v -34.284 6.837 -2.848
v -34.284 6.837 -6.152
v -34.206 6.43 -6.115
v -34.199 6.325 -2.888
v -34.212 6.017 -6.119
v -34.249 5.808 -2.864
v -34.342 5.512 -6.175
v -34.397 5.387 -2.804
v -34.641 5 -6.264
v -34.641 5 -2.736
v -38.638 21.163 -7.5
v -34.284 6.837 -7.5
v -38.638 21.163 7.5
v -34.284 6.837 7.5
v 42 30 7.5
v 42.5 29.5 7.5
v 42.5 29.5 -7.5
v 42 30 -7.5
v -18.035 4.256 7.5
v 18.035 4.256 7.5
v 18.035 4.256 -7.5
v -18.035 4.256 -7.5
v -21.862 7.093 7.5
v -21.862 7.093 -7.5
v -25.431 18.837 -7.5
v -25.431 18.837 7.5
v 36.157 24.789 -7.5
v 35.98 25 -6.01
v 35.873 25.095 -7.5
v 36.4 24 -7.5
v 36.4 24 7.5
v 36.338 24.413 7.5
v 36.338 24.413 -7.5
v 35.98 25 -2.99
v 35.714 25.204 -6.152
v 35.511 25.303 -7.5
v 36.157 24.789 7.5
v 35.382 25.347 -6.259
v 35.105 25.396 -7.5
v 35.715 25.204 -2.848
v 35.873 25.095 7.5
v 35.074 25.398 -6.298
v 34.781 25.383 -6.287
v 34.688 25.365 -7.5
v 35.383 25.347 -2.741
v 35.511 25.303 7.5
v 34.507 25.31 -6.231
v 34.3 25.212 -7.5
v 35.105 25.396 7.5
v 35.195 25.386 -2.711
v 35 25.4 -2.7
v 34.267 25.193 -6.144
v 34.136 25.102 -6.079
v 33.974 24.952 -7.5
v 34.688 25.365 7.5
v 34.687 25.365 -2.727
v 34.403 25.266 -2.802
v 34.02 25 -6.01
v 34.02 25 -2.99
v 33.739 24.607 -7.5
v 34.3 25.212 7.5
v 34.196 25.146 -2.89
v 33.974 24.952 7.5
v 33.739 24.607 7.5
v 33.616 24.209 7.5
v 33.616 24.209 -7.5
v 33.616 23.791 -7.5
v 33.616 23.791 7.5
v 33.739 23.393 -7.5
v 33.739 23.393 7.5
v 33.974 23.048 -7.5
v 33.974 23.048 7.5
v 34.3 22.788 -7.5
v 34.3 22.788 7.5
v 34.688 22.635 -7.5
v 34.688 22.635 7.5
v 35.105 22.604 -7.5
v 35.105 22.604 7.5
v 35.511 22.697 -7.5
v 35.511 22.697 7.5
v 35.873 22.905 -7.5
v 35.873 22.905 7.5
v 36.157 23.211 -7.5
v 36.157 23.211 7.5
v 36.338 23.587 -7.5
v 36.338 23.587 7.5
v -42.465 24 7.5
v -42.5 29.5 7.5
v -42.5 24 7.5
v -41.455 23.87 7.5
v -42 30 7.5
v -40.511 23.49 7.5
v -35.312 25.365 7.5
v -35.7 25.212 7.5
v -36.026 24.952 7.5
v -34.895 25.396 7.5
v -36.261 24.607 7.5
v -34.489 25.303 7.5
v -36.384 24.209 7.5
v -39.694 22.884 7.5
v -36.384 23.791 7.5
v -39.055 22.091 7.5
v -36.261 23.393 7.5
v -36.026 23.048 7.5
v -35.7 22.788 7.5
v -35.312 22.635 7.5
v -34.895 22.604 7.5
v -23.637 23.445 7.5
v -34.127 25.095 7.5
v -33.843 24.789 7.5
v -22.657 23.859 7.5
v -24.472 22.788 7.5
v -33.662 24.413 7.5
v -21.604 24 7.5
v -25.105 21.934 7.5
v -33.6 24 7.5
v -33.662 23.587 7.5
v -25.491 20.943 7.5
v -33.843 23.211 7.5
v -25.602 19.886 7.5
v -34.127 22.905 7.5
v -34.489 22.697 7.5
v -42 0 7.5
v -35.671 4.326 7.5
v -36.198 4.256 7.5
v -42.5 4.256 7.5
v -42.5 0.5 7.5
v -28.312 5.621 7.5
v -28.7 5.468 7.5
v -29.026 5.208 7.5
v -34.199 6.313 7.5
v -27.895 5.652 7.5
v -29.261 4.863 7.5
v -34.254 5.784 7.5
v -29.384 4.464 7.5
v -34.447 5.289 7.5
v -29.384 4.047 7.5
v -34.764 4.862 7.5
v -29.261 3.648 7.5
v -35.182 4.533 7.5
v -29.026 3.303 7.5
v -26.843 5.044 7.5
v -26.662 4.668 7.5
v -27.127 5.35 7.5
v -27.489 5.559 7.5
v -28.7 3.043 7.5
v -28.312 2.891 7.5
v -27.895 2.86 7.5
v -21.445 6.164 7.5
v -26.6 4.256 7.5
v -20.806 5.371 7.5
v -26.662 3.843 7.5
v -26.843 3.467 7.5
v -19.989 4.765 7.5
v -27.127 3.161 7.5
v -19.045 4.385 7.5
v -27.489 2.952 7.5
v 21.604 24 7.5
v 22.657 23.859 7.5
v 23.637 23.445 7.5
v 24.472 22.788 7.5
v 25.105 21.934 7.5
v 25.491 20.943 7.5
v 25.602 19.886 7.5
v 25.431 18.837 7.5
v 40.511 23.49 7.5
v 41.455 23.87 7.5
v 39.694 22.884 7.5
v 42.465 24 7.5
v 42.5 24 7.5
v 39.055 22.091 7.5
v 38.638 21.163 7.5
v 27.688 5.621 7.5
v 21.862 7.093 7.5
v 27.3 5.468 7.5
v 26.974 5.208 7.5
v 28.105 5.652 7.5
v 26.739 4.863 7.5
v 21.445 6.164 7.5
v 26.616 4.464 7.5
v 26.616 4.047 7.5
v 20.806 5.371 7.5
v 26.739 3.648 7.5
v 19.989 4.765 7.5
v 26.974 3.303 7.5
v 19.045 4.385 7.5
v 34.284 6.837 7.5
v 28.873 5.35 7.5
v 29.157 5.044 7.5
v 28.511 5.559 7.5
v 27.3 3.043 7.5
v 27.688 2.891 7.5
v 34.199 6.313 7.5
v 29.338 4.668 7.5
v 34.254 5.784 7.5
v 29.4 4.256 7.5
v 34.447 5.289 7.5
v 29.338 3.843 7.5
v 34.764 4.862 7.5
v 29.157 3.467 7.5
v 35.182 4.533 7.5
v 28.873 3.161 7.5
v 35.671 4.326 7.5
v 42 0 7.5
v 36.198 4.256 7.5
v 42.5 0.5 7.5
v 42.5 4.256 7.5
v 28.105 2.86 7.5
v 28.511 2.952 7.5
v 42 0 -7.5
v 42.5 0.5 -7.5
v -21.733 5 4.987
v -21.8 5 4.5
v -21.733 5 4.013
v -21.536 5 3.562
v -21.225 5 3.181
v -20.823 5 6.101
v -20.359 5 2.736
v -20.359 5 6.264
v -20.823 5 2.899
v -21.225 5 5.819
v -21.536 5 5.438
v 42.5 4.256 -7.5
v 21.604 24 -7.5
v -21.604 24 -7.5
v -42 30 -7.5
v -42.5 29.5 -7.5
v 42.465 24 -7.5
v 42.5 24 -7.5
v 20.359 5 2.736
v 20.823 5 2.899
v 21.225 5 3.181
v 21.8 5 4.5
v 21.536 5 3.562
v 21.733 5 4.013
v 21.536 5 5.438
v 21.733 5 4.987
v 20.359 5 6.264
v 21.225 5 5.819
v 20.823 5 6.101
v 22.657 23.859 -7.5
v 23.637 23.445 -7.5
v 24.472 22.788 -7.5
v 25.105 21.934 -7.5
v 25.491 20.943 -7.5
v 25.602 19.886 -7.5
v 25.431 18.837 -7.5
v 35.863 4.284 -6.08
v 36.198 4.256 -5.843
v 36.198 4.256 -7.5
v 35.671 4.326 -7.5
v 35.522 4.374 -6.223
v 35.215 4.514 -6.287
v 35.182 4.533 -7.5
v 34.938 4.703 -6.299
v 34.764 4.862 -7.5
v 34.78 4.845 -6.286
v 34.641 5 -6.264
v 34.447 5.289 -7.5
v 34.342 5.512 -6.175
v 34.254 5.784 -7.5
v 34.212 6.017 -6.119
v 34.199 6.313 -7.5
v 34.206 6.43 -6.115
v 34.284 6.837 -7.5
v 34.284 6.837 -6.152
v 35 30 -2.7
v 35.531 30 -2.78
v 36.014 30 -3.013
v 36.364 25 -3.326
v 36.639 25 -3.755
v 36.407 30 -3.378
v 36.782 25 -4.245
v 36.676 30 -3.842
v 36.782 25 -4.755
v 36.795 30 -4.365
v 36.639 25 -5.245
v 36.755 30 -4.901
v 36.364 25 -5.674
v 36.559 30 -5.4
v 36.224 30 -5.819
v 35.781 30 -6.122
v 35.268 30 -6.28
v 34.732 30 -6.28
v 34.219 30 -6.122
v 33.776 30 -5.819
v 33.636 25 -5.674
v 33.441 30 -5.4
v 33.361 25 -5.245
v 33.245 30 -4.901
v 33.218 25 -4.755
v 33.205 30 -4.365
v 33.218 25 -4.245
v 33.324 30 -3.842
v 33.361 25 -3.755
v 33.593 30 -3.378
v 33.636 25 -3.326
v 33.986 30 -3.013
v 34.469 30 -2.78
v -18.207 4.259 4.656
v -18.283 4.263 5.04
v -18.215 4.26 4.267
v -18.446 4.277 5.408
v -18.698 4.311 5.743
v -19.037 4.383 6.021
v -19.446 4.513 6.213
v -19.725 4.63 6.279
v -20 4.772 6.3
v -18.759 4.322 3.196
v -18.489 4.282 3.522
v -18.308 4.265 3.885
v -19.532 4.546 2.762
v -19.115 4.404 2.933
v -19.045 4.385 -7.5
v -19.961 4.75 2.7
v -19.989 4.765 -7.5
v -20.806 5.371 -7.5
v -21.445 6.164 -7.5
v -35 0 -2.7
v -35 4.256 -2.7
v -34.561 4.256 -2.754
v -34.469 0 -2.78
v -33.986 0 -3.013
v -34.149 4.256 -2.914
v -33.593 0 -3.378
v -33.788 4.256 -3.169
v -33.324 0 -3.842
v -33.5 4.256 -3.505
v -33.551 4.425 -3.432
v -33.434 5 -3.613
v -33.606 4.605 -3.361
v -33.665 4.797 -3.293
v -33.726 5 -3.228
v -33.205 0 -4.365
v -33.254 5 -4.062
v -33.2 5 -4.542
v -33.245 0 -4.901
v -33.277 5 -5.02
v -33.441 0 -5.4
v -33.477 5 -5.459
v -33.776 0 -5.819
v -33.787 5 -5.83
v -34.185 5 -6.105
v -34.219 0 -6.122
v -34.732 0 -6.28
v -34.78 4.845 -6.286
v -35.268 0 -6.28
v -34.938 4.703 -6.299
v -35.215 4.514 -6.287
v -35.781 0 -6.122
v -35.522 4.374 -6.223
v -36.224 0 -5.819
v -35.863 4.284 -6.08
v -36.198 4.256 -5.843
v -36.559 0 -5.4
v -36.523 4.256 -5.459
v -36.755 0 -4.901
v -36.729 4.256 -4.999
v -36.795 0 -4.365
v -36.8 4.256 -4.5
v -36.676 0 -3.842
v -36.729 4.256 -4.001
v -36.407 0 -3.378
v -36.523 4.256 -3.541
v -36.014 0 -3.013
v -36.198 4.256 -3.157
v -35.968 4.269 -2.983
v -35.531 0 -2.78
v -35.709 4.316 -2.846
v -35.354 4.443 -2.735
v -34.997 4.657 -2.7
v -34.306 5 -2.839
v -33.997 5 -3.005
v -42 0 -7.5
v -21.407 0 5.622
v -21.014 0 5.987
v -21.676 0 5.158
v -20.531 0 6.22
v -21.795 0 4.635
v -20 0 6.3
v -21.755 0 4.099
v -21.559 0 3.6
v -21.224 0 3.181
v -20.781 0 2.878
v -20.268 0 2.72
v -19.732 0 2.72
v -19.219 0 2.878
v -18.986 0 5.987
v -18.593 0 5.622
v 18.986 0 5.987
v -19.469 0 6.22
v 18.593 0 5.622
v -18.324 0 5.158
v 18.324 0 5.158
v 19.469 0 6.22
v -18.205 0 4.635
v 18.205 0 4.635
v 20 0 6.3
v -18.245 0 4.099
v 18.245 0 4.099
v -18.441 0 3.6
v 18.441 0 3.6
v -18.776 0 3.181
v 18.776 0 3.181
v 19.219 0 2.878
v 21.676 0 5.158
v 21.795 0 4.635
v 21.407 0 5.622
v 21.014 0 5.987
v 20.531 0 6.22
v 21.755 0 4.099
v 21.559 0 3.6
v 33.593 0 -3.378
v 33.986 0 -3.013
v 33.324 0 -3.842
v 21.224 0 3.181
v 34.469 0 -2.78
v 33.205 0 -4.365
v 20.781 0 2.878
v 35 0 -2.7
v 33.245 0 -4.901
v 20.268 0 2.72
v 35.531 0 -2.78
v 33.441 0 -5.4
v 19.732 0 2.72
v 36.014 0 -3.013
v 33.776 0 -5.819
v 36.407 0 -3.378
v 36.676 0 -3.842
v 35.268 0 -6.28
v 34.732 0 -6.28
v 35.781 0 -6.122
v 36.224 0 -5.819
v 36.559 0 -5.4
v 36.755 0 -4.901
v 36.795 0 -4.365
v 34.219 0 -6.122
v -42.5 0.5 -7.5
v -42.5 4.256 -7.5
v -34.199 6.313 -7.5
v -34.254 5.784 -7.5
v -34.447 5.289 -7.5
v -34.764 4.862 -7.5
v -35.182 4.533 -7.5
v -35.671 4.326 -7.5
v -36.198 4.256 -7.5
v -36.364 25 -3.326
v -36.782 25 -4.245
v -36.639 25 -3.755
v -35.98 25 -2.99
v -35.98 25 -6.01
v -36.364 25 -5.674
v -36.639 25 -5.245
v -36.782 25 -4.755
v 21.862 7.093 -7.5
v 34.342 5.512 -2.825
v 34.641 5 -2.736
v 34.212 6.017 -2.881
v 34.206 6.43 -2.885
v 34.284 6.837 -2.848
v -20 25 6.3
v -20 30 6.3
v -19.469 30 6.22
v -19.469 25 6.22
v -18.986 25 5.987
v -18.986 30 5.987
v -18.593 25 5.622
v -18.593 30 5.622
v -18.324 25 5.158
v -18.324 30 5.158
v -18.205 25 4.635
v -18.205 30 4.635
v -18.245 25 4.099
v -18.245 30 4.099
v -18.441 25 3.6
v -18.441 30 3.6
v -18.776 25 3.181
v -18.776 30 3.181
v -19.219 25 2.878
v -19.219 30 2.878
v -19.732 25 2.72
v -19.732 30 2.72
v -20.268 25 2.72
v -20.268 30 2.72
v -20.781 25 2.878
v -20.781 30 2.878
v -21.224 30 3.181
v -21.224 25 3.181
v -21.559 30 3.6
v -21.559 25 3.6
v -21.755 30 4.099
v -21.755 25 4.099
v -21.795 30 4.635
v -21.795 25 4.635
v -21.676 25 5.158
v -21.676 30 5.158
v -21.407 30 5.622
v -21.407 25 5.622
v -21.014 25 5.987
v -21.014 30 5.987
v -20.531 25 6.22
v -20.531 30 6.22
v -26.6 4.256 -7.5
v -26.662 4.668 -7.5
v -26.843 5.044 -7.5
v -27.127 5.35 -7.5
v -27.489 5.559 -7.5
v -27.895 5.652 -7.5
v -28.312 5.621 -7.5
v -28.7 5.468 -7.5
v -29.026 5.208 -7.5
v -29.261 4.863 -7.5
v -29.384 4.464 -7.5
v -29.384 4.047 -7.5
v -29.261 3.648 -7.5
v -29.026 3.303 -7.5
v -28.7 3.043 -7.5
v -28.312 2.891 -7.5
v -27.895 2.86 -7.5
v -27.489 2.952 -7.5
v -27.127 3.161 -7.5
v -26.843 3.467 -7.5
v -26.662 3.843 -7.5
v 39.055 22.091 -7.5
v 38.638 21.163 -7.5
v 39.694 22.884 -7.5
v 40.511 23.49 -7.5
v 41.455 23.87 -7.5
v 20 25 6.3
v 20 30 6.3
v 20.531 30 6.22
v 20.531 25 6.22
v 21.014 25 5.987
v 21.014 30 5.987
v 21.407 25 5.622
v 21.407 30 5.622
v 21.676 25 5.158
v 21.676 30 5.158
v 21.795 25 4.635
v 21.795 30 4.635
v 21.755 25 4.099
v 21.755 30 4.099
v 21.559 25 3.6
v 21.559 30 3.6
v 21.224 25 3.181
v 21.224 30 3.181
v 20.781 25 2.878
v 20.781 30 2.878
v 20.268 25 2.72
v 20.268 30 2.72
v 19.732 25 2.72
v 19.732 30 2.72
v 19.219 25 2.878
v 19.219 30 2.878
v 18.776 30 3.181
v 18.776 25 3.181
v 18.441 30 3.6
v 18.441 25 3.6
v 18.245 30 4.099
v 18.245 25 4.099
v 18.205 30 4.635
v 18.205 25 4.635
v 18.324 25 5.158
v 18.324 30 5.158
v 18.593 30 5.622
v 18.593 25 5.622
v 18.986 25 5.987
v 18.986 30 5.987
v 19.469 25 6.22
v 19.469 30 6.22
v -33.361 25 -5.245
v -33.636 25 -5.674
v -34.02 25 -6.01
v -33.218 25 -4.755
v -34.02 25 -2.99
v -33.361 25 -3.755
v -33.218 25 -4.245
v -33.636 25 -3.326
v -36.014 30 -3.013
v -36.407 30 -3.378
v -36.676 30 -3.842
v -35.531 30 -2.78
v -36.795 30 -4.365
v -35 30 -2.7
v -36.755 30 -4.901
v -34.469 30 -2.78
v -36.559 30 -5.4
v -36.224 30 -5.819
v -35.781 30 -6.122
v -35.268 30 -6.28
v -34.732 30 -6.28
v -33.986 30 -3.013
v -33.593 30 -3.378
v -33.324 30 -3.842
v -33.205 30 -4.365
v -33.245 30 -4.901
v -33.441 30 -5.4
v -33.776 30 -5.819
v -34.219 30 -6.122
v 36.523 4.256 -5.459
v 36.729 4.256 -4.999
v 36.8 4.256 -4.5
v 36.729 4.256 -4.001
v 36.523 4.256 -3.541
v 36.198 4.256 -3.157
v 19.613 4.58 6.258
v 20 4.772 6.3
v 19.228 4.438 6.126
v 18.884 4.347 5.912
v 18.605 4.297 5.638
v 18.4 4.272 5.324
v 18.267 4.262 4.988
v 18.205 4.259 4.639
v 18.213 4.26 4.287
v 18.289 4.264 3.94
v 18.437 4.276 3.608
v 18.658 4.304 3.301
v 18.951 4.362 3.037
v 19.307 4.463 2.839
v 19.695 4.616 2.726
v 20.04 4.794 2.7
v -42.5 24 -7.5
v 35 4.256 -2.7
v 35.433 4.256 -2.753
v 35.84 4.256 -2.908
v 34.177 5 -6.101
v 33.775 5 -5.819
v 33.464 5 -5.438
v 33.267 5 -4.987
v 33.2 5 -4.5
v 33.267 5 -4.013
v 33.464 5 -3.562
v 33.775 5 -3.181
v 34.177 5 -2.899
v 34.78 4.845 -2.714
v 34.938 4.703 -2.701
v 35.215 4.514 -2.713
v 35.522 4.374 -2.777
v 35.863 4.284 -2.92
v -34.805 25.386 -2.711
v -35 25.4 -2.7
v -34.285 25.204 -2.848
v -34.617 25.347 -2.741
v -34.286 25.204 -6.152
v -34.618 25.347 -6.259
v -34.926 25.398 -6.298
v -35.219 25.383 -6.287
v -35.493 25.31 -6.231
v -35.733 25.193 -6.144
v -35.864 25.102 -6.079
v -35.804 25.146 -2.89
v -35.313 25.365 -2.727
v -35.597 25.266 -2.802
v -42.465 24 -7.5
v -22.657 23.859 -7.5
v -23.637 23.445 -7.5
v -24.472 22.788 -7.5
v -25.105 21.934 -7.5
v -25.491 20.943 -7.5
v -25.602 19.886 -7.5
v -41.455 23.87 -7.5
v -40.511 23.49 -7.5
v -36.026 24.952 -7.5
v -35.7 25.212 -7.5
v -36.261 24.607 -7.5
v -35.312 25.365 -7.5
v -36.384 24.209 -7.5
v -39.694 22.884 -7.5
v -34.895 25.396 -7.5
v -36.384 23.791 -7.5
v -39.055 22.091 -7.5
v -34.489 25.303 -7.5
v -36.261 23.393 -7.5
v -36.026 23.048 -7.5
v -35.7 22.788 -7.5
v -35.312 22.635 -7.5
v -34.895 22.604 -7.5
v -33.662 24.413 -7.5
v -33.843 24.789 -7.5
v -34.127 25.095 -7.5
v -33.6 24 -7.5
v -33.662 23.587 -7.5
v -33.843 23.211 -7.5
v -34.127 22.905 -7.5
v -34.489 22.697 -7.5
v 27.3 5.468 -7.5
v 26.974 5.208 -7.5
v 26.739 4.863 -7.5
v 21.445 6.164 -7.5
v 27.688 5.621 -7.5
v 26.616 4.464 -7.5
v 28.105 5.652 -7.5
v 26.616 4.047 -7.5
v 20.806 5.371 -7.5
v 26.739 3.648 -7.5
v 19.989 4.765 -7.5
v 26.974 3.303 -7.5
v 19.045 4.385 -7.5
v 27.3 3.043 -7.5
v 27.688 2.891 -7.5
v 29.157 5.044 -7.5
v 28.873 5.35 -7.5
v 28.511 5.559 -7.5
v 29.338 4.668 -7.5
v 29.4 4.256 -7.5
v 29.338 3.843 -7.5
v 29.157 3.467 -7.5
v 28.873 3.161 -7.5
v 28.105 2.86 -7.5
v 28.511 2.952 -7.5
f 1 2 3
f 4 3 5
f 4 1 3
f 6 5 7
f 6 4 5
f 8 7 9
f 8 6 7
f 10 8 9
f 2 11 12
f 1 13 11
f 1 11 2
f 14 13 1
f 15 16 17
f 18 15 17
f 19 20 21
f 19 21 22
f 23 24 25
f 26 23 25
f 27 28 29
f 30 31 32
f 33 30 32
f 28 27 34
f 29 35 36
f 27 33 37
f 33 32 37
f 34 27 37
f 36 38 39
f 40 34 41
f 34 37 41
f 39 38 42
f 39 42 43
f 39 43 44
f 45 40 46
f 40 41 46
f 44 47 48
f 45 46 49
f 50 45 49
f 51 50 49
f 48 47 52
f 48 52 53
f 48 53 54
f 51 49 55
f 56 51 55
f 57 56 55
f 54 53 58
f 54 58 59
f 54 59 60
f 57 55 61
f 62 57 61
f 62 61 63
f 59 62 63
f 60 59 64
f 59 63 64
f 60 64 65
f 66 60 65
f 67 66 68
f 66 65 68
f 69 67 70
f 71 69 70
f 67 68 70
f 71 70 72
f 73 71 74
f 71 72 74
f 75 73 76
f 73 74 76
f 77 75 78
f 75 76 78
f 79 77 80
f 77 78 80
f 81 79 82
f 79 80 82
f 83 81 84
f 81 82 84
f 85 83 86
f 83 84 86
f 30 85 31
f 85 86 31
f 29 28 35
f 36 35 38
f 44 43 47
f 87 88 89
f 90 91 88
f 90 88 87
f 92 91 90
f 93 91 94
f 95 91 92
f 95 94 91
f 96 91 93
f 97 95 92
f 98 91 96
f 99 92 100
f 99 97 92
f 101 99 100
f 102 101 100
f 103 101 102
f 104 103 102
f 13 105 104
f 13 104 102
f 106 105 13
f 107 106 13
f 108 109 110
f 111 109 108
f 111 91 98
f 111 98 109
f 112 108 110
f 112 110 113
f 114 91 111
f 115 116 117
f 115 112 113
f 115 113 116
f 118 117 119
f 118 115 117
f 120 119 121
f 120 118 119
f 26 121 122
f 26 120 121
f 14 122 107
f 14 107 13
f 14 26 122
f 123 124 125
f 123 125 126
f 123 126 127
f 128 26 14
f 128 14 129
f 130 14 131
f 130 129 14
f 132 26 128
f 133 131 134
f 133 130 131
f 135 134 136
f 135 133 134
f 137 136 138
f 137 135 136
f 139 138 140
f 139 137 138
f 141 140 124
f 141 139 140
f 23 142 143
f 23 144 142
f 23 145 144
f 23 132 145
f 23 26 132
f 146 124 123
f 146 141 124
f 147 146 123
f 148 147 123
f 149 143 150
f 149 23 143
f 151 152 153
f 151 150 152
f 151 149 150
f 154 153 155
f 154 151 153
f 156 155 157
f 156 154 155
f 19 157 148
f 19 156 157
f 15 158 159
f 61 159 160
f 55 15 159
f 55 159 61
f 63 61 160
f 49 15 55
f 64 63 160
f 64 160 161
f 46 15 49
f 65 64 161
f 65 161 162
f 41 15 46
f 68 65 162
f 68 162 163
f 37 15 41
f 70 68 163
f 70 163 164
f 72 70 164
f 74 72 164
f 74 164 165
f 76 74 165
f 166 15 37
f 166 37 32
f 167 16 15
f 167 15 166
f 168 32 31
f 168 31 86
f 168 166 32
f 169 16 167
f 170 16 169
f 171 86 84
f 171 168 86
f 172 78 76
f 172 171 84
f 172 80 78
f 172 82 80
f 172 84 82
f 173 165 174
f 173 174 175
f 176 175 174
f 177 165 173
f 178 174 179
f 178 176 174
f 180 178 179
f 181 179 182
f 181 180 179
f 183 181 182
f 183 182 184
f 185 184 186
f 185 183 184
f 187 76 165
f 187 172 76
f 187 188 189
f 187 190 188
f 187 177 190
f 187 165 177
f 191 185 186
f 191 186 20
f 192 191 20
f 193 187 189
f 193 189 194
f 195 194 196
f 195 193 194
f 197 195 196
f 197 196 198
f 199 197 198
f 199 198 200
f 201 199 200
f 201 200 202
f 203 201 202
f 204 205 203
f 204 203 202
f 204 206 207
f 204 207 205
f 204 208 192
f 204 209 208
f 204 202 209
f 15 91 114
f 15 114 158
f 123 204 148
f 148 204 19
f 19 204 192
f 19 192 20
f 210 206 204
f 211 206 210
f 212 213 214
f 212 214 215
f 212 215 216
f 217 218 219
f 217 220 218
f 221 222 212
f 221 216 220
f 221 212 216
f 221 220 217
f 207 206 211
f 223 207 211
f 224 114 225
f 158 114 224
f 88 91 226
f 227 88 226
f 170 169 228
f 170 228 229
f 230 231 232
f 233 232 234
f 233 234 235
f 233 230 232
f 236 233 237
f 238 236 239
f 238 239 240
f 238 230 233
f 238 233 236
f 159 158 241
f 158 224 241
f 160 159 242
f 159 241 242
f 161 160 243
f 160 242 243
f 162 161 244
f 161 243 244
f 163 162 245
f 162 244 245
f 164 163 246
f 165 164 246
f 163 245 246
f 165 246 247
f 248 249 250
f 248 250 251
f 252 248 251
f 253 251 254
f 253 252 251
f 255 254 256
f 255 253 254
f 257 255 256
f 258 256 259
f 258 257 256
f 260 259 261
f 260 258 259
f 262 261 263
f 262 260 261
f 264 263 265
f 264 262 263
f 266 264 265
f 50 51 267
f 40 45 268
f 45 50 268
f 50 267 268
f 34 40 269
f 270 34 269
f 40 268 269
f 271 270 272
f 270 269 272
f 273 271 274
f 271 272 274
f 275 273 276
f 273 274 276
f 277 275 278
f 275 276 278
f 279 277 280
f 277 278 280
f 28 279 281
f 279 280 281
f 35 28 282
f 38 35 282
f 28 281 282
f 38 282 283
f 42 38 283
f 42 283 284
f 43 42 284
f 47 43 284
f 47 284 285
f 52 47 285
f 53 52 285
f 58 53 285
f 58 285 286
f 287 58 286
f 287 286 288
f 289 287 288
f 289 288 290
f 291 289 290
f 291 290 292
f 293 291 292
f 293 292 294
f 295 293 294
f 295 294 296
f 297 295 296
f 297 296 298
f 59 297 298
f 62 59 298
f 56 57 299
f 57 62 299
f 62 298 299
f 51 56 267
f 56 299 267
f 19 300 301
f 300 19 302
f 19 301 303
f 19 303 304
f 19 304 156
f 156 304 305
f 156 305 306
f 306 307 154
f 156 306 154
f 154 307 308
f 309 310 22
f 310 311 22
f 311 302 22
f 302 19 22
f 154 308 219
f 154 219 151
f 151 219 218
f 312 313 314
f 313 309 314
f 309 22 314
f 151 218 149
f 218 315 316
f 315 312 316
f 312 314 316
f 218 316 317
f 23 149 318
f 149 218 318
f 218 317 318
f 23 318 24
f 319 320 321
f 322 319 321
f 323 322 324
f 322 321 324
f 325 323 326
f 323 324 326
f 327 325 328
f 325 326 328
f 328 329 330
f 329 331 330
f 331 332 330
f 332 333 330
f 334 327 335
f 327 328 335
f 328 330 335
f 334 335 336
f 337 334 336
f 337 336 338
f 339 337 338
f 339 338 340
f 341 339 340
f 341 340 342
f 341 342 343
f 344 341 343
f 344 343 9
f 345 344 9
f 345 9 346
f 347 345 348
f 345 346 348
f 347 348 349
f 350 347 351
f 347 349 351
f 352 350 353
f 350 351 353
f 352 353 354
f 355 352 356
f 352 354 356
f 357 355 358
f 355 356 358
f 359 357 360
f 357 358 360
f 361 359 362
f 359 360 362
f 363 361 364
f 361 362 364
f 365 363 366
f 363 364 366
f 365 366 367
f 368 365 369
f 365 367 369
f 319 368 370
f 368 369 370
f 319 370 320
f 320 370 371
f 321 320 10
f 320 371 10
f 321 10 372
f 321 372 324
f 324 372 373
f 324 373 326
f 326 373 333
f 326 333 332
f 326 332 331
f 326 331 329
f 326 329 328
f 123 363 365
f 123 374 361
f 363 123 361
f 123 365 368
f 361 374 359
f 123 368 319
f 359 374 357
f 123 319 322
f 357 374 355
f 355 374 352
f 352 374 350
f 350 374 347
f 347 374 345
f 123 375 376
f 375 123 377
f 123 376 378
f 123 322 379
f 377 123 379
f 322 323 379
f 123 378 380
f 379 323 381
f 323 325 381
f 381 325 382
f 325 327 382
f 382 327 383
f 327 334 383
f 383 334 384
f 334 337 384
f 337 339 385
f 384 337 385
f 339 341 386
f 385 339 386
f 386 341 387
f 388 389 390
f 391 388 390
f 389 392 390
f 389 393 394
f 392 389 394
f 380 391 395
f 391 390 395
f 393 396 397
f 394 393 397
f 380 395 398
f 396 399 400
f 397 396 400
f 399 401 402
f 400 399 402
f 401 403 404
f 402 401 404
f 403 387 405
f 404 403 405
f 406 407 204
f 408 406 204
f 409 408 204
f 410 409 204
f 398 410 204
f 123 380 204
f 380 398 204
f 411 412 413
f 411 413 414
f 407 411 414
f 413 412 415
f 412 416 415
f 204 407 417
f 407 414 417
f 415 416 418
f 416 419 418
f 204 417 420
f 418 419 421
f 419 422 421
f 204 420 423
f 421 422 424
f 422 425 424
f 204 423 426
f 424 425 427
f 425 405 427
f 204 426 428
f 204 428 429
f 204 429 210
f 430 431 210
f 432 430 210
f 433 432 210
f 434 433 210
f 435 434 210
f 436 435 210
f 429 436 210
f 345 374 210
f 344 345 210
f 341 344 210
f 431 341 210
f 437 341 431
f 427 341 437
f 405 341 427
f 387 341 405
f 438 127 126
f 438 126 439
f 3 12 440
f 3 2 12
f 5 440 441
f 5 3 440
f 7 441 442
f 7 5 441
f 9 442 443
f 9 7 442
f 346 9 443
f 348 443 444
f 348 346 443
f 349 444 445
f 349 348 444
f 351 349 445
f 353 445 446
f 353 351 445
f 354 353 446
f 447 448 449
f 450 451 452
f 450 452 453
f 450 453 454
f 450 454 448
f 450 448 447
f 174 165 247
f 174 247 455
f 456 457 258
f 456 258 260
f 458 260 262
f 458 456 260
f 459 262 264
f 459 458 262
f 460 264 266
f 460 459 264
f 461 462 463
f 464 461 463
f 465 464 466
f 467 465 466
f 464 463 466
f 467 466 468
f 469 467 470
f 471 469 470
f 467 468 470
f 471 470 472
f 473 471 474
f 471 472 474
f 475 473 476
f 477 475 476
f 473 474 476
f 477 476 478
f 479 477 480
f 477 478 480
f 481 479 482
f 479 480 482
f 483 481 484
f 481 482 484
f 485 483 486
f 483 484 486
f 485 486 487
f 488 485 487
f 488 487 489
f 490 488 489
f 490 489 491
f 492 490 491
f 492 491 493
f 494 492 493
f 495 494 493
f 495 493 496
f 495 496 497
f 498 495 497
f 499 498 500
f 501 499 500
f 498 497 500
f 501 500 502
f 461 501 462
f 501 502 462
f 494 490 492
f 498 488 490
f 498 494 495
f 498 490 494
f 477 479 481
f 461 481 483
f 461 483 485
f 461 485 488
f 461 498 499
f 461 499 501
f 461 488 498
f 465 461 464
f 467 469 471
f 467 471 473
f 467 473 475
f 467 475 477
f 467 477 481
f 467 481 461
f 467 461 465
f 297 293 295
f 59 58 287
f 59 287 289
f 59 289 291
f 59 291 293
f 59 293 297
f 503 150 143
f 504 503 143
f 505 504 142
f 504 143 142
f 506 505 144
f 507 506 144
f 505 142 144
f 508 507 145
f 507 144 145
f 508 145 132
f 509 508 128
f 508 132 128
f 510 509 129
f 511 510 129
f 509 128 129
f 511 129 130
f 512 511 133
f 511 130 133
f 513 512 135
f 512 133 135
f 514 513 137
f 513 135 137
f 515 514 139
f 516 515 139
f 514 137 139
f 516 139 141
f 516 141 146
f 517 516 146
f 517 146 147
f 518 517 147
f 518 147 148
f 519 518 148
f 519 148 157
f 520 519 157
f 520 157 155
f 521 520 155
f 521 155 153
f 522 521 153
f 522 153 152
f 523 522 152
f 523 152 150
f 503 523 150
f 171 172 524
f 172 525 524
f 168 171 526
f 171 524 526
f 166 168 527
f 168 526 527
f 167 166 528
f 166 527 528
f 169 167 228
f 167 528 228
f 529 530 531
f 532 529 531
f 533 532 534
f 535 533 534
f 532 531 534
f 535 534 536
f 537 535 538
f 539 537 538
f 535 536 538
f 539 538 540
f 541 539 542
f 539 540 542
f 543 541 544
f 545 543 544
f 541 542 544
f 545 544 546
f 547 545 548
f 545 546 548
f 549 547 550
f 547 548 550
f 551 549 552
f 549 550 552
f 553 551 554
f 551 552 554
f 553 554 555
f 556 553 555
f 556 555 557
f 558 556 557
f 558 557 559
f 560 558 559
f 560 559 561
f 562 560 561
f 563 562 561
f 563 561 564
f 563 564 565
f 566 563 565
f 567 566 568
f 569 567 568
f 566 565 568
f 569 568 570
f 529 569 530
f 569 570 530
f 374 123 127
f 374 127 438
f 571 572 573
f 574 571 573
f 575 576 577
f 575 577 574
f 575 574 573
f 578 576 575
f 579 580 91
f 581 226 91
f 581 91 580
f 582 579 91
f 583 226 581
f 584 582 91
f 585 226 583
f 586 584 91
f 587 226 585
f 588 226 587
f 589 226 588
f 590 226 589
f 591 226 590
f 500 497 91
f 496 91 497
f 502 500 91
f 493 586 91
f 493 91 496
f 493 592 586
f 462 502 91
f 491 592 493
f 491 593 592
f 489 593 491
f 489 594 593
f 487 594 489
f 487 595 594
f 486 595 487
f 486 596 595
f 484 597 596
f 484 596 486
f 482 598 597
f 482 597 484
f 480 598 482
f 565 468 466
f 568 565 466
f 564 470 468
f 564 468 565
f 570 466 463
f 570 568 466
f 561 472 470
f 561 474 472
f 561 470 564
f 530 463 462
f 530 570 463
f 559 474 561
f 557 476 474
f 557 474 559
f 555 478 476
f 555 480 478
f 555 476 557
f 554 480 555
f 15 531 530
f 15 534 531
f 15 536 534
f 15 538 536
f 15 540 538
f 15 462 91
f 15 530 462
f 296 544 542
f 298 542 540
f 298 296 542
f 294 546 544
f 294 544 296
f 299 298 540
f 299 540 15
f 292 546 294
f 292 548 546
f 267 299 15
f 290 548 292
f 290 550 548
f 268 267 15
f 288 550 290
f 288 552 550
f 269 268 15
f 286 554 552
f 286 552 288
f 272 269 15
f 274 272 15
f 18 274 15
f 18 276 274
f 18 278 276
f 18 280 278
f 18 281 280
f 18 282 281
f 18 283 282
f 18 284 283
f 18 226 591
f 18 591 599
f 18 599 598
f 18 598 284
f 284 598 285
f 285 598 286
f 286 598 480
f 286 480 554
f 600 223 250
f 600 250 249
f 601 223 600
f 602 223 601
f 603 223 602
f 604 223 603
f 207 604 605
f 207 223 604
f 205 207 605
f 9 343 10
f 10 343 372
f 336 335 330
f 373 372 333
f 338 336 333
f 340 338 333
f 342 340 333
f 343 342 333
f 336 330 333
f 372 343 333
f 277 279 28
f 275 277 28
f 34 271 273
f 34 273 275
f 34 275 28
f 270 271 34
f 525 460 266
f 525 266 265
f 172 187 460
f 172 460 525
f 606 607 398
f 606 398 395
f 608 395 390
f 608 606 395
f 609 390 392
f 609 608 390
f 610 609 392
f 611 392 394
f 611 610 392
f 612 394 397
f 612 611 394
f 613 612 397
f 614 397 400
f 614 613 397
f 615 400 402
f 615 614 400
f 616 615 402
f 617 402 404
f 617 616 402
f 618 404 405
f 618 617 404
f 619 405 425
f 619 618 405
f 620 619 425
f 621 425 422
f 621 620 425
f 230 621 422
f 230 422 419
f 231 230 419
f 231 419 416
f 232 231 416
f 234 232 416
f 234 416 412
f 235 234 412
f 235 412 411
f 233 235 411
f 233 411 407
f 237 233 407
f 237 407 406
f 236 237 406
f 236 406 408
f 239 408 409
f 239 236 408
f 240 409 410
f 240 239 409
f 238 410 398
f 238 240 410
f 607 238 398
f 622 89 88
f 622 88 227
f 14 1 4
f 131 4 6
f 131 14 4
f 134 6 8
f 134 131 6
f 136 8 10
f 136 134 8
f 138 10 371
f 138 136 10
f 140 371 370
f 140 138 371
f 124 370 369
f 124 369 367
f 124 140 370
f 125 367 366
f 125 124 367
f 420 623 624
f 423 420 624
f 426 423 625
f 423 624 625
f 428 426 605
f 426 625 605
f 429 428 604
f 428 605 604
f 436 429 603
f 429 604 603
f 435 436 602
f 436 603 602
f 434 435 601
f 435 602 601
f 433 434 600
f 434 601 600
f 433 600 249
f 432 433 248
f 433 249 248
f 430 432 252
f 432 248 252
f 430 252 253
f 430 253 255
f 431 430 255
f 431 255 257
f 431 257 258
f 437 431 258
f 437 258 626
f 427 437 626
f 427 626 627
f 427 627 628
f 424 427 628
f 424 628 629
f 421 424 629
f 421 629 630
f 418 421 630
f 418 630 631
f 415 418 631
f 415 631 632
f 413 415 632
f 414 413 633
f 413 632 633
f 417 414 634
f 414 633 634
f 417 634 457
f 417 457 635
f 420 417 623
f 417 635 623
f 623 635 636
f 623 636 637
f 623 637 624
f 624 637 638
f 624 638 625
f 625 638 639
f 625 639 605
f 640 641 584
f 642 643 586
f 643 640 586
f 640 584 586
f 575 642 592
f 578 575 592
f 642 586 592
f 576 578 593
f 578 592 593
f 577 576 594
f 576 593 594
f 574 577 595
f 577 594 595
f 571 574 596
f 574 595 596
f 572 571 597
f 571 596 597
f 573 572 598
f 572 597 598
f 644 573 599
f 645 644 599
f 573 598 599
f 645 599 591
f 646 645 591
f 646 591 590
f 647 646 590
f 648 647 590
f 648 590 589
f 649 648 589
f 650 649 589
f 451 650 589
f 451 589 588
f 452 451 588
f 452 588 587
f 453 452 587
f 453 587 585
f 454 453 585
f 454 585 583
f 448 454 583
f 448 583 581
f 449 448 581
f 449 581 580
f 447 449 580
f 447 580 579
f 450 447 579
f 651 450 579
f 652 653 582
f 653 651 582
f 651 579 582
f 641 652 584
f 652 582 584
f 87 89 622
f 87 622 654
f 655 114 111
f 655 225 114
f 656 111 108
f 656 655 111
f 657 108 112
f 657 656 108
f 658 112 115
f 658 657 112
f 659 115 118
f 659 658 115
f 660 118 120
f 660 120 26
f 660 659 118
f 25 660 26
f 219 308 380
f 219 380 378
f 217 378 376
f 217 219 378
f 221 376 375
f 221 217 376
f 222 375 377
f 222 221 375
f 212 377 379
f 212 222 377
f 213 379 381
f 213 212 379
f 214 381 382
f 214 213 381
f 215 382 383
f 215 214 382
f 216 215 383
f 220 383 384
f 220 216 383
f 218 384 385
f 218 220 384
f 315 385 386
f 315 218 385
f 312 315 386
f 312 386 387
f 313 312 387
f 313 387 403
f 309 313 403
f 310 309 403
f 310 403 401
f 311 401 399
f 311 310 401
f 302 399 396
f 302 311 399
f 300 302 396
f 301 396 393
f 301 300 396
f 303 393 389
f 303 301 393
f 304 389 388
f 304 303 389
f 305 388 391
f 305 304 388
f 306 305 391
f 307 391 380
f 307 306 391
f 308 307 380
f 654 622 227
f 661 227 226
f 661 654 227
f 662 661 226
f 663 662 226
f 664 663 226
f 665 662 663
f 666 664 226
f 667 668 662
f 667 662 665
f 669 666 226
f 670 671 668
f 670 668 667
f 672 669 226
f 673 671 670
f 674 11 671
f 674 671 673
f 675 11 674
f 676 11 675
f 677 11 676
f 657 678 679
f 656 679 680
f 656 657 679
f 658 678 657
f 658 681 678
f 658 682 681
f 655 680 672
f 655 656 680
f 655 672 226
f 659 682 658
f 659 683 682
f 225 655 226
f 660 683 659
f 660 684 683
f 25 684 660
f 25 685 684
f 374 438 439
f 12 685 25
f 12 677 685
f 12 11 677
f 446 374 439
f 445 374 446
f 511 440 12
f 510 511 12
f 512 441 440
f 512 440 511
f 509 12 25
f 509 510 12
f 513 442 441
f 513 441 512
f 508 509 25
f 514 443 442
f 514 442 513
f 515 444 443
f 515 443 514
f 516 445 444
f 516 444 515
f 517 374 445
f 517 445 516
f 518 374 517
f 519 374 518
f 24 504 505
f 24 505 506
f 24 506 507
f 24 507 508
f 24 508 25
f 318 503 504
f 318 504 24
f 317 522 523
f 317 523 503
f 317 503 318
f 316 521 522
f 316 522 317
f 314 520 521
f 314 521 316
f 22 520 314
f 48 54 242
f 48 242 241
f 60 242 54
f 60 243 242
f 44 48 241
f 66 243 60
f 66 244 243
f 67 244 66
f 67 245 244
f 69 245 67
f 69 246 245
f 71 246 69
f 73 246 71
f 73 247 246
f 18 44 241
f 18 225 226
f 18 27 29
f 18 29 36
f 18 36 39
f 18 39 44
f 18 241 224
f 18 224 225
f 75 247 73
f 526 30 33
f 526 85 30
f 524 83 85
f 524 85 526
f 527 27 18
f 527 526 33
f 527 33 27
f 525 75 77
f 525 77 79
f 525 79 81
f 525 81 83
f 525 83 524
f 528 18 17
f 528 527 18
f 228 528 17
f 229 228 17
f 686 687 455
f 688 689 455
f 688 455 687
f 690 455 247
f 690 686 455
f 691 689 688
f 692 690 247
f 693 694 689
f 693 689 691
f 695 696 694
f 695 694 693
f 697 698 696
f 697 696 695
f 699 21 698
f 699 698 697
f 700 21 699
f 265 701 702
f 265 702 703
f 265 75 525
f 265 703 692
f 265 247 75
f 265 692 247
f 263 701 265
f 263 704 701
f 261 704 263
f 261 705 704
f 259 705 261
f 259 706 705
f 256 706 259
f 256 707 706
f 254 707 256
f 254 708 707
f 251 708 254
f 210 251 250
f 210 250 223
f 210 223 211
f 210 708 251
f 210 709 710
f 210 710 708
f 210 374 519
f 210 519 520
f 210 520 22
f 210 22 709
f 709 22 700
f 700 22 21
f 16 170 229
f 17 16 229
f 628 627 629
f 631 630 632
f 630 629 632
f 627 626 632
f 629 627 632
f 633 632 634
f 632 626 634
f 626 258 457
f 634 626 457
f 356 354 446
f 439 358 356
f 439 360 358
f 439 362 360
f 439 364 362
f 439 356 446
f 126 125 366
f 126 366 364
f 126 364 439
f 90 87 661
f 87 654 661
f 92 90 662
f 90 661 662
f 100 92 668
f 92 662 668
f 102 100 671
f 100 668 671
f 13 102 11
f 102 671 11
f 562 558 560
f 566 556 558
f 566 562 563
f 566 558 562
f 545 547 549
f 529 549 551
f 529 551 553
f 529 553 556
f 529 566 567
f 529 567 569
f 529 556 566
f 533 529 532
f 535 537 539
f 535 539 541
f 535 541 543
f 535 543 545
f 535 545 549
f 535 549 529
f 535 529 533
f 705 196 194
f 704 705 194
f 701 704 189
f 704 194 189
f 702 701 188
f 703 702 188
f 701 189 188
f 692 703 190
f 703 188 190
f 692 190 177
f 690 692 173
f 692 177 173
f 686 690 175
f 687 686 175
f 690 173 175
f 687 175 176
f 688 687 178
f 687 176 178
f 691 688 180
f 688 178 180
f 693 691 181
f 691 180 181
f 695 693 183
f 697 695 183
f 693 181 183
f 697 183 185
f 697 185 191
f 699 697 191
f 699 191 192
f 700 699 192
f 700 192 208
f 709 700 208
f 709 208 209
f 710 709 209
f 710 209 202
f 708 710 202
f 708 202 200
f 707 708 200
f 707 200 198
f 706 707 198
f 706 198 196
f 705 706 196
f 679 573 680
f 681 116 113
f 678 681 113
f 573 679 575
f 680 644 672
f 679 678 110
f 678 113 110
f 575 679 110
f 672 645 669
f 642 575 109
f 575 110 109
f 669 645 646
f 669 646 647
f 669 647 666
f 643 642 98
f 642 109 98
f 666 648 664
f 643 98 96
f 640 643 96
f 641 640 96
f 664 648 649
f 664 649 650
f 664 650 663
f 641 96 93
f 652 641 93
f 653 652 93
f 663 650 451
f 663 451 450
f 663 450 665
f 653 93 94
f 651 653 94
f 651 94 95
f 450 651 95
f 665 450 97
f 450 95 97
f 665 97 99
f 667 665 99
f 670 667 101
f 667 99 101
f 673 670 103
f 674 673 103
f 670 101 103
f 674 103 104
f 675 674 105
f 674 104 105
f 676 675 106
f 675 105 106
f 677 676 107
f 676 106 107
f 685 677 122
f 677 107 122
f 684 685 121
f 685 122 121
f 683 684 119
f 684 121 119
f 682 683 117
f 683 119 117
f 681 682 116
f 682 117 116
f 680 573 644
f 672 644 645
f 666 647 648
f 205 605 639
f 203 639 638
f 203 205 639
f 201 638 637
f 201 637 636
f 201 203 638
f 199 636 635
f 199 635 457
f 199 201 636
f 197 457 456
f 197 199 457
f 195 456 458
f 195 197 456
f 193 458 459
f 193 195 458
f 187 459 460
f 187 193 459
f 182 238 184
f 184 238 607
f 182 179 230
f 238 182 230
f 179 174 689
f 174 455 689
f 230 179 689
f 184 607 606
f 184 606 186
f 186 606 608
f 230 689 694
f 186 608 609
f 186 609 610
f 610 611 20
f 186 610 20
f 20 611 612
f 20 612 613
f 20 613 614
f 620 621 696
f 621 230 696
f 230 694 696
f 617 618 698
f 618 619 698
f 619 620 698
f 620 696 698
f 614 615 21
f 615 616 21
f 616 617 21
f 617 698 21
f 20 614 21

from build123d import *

# Parameters (mm, degrees)
SKETCH_1_W          = 85
SKETCH_1_H          = 15
EXTRUDE_1_DEPTH     = 30
SKETCH_2_R          = 1.4
CUT_EXTRUDE_1_DEPTH = 40
CUT_EXTRUDE_2_DEPTH = 40
FILLET_1_R          = 4
SKETCH_5_R          = 1.8
CUT_EXTRUDE_3_DEPTH = 5
CHAMFER_1_SIZE      = 0.5
CUT_EXTRUDE_4_DEPTH = 24
FILLET_3_R          = 4
CUT_EXTRUDE_START   = -5
SKETCH_9_R          = 1.8
CUT_EXTRUDE_5_DEPTH = 5
FILLET_4_R          = 2


with BuildPart() as part:
    # 草图1 → 凸台-拉伸1 (new body)
    with BuildSketch(Plane(origin=(0, 0, 0), x_dir=(1, 0, 0), z_dir=(0, 1, 0))):
        Rectangle(SKETCH_1_W, SKETCH_1_H)
    extrude(amount=EXTRUDE_1_DEPTH)

    # 草图2 → 切除-拉伸1 (cut)
    with BuildSketch(Plane.XY.offset(7.5)):
        with Locations((-35, 24)):
            Circle(SKETCH_2_R)
        with Locations((35, 24)):
            Circle(SKETCH_2_R)
        with Locations((28, 4.255699158)):
            Circle(SKETCH_2_R)
        with Locations((-28, 4.255699158)):
            Circle(SKETCH_2_R)
    extrude(amount=-CUT_EXTRUDE_1_DEPTH, mode=Mode.SUBTRACT)

    # 草图3 → 切除-拉伸2 (cut)
    with BuildSketch(Plane.XY.offset(7.5)):
        Polygon((-27, 24), (27, 24), (21, 4.255699158), (-21, 4.255699158), align=None)
    extrude(amount=-CUT_EXTRUDE_2_DEPTH, mode=Mode.SUBTRACT)

    # 圆角1
    fillet_1_edges = [part.edges().sort_by_distance(p)[0] for p in [
        (-21, 4.255699158, 0),
        (-27, 24, 0),
        (27, 24, 0),
        (21, 4.255699158, 0),
    ]]
    fillet(fillet_1_edges, radius=FILLET_1_R)

    # 草图5 → 切除-拉伸3 (cut)
    with BuildSketch(Plane(origin=(0, 30, 0), x_dir=(1, 0, 0), z_dir=(0, 1, 0))):
        with Locations(Location((-35, 4.5, 0), (0, 0, 270))):
            Circle(SKETCH_5_R)
        with Locations(Location((35, 4.5, 0), (0, 0, 270))):
            Circle(SKETCH_5_R)
        with Locations(Location((-20, -4.5, 0), (0, 0, 270))):
            Circle(SKETCH_5_R)
        with Locations(Location((20, -4.5, 0), (0, 0, 270))):
            Circle(SKETCH_5_R)
    extrude(amount=-CUT_EXTRUDE_3_DEPTH, mode=Mode.SUBTRACT)

    # 倒角1
    chamfer_1_edges = [part.edges().sort_by_distance(p)[0] for p in [
        (-42.5, 30, 0),
        (42.5, 30, 0),
        (-42.5, 0, 0),
        (42.5, 0, 0),
    ]]
    chamfer(chamfer_1_edges, length=CHAMFER_1_SIZE)

    # 草图6 → 切除-拉伸4 (cut)
    with BuildSketch(Plane.XY.offset(7.5)):
        Polygon((-42.5, 24), (-39.5, 24), (-33.5, 4.255699158), (-42.5, 4.255699158), align=None)
        Polygon((42.5, 24), (42.5, 4.255699158), (33.5, 4.255699158), (39.5, 24), align=None)
    extrude(amount=-CUT_EXTRUDE_4_DEPTH, mode=Mode.SUBTRACT)

    # 圆角3
    fillet_3_edges = [part.edges().sort_by_distance(p)[0] for p in [
        (-39.5, 24, 0),
        (39.5, 24, 0),
    ]]
    fillet(fillet_3_edges, radius=FILLET_3_R)

    # 草图9 → 切除-拉伸5 (cut)
    with BuildSketch(Plane.XZ.offset(CUT_EXTRUDE_START)):
        with Locations(Location((20, 4.5, 0), (0, 0, 90))):
            Circle(SKETCH_9_R)
        with Locations(Location((-20, 4.5, 0), (0, 0, 90))):
            Circle(SKETCH_9_R)
        with Locations(Location((-35, -4.5, 0), (0, 0, 90))):
            Circle(SKETCH_9_R)
        with Locations(Location((35, -4.5, 0), (0, 0, 90))):
            Circle(SKETCH_9_R)
    extrude(amount=CUT_EXTRUDE_5_DEPTH, mode=Mode.SUBTRACT)

    # 圆角4
    # the kernel refuses this fillet: 2 mm, written as the material it adds along each edge
    with BuildSketch(Plane(origin=(-33.5, 4.255699158, 7.5), x_dir=(-1, 0, 0), z_dir=(0, 0, -1))) as fillet_4_piece_1_section:
        with BuildLine():
            CenterArc((FILLET_4_R * 1.34903882702, FILLET_4_R), FILLET_4_R, 163.096751643, 106.903248357)
            Line((FILLET_4_R * 0.392241725729, FILLET_4_R * 1.29075643923), (0, 0))
            Line((0, 0), (FILLET_4_R * 1.34903882702, 0))
        make_face()
    fillet_4_piece_1 = extrude(amount=17.750206698, mode=Mode.PRIVATE)
    fillet_4_piece_1 = split(fillet_4_piece_1, bisect_by=Plane(origin=(-34.397620366, 4.568933738, -7.5), z_dir=(0, 0, 1)), keep=Keep.TOP, mode=Mode.PRIVATE)
    fillet_4_piece_1 = fillet_4_piece_1 - Plane(origin=(-35, 4.568933738, -4.5), x_dir=(0, 0, 1), z_dir=(0, 1, 0)) * Cylinder(1.8, 47, mode=Mode.PRIVATE)
    add(fillet_4_piece_1)
    with BuildSketch(Plane(origin=(-33.5, 4.255699158, 7.5), x_dir=(-1, 0, 0), z_dir=(0, 0, -1))) as fillet_4_piece_2_section:
        with BuildLine():
            CenterArc((FILLET_4_R * 1.34903882702, FILLET_4_R), FILLET_4_R, 163.096751643, 106.903248357)
            Line((FILLET_4_R * 0.392241725729, FILLET_4_R * 1.29075643923), (0, 0))
            Line((0, 0), (FILLET_4_R * 1.34903882702, 0))
        make_face()
    fillet_4_piece_2 = extrude(amount=17.750206698, mode=Mode.PRIVATE)
    fillet_4_piece_2 = split(fillet_4_piece_2, bisect_by=Plane(origin=(-34.145110505, 5.458310784, -7.5), z_dir=(0, 0, 1)), keep=Keep.TOP, mode=Mode.PRIVATE)
    fillet_4_piece_2 = split(fillet_4_piece_2, bisect_by=Plane(origin=(-34.145110505, 5, -4.499999953), z_dir=(0, 1, 0)), keep=Keep.TOP, mode=Mode.PRIVATE)
    add(fillet_4_piece_2)
    with BuildSketch(Plane(origin=(33.5, 4.255699158, 7.5), x_dir=(0.2907564392301515, 0.9567971012948373, 0), z_dir=(0, 0, -1))) as fillet_4_piece_3_section:
        with BuildLine():
            CenterArc((FILLET_4_R * 1.34903882702, FILLET_4_R), FILLET_4_R, 163.096751643, 106.903248357)
            Line((FILLET_4_R * 0.392241725729, FILLET_4_R * 1.29075643923), (0, 0))
            Line((0, 0), (FILLET_4_R * 1.34903882702, 0))
        make_face()
    fillet_4_piece_3 = extrude(amount=17.750206698, mode=Mode.PRIVATE)
    fillet_4_piece_3 = split(fillet_4_piece_3, bisect_by=Plane(origin=(34.133275605, 5.45760424, -7.5), z_dir=(0, 0, 1)), keep=Keep.TOP, mode=Mode.PRIVATE)
    fillet_4_piece_3 = fillet_4_piece_3 - Plane(origin=(35, 5.45760424, -4.5), x_dir=(0, 0, 1), z_dir=(0, 1, 0)) * Cylinder(1.8, 47, mode=Mode.PRIVATE)
    add(fillet_4_piece_3)
    with BuildSketch(Plane(origin=(33.5, 4.255699158, 7.5), x_dir=(0.2907564392301515, 0.9567971012948373, 0), z_dir=(0, 0, -1))) as fillet_4_piece_4_section:
        with BuildLine():
            CenterArc((FILLET_4_R * 1.34903882702, FILLET_4_R), FILLET_4_R, 163.096751643, 106.903248357)
            Line((FILLET_4_R * 0.392241725729, FILLET_4_R * 1.29075643923), (0, 0))
            Line((0, 0), (FILLET_4_R * 1.34903882702, 0))
        make_face()
    fillet_4_piece_4 = extrude(amount=17.750206698, mode=Mode.PRIVATE)
    fillet_4_piece_4 = split(fillet_4_piece_4, bisect_by=Plane(origin=(34.145110504, 5.458310885, -7.5), z_dir=(0, 0, 1)), keep=Keep.TOP, mode=Mode.PRIVATE)
    fillet_4_piece_4 = split(fillet_4_piece_4, bisect_by=Plane(origin=(34.145110504, 5, -4.499999944), z_dir=(0, 1, 0)), keep=Keep.TOP, mode=Mode.PRIVATE)
    add(fillet_4_piece_4)


solid = part.part
